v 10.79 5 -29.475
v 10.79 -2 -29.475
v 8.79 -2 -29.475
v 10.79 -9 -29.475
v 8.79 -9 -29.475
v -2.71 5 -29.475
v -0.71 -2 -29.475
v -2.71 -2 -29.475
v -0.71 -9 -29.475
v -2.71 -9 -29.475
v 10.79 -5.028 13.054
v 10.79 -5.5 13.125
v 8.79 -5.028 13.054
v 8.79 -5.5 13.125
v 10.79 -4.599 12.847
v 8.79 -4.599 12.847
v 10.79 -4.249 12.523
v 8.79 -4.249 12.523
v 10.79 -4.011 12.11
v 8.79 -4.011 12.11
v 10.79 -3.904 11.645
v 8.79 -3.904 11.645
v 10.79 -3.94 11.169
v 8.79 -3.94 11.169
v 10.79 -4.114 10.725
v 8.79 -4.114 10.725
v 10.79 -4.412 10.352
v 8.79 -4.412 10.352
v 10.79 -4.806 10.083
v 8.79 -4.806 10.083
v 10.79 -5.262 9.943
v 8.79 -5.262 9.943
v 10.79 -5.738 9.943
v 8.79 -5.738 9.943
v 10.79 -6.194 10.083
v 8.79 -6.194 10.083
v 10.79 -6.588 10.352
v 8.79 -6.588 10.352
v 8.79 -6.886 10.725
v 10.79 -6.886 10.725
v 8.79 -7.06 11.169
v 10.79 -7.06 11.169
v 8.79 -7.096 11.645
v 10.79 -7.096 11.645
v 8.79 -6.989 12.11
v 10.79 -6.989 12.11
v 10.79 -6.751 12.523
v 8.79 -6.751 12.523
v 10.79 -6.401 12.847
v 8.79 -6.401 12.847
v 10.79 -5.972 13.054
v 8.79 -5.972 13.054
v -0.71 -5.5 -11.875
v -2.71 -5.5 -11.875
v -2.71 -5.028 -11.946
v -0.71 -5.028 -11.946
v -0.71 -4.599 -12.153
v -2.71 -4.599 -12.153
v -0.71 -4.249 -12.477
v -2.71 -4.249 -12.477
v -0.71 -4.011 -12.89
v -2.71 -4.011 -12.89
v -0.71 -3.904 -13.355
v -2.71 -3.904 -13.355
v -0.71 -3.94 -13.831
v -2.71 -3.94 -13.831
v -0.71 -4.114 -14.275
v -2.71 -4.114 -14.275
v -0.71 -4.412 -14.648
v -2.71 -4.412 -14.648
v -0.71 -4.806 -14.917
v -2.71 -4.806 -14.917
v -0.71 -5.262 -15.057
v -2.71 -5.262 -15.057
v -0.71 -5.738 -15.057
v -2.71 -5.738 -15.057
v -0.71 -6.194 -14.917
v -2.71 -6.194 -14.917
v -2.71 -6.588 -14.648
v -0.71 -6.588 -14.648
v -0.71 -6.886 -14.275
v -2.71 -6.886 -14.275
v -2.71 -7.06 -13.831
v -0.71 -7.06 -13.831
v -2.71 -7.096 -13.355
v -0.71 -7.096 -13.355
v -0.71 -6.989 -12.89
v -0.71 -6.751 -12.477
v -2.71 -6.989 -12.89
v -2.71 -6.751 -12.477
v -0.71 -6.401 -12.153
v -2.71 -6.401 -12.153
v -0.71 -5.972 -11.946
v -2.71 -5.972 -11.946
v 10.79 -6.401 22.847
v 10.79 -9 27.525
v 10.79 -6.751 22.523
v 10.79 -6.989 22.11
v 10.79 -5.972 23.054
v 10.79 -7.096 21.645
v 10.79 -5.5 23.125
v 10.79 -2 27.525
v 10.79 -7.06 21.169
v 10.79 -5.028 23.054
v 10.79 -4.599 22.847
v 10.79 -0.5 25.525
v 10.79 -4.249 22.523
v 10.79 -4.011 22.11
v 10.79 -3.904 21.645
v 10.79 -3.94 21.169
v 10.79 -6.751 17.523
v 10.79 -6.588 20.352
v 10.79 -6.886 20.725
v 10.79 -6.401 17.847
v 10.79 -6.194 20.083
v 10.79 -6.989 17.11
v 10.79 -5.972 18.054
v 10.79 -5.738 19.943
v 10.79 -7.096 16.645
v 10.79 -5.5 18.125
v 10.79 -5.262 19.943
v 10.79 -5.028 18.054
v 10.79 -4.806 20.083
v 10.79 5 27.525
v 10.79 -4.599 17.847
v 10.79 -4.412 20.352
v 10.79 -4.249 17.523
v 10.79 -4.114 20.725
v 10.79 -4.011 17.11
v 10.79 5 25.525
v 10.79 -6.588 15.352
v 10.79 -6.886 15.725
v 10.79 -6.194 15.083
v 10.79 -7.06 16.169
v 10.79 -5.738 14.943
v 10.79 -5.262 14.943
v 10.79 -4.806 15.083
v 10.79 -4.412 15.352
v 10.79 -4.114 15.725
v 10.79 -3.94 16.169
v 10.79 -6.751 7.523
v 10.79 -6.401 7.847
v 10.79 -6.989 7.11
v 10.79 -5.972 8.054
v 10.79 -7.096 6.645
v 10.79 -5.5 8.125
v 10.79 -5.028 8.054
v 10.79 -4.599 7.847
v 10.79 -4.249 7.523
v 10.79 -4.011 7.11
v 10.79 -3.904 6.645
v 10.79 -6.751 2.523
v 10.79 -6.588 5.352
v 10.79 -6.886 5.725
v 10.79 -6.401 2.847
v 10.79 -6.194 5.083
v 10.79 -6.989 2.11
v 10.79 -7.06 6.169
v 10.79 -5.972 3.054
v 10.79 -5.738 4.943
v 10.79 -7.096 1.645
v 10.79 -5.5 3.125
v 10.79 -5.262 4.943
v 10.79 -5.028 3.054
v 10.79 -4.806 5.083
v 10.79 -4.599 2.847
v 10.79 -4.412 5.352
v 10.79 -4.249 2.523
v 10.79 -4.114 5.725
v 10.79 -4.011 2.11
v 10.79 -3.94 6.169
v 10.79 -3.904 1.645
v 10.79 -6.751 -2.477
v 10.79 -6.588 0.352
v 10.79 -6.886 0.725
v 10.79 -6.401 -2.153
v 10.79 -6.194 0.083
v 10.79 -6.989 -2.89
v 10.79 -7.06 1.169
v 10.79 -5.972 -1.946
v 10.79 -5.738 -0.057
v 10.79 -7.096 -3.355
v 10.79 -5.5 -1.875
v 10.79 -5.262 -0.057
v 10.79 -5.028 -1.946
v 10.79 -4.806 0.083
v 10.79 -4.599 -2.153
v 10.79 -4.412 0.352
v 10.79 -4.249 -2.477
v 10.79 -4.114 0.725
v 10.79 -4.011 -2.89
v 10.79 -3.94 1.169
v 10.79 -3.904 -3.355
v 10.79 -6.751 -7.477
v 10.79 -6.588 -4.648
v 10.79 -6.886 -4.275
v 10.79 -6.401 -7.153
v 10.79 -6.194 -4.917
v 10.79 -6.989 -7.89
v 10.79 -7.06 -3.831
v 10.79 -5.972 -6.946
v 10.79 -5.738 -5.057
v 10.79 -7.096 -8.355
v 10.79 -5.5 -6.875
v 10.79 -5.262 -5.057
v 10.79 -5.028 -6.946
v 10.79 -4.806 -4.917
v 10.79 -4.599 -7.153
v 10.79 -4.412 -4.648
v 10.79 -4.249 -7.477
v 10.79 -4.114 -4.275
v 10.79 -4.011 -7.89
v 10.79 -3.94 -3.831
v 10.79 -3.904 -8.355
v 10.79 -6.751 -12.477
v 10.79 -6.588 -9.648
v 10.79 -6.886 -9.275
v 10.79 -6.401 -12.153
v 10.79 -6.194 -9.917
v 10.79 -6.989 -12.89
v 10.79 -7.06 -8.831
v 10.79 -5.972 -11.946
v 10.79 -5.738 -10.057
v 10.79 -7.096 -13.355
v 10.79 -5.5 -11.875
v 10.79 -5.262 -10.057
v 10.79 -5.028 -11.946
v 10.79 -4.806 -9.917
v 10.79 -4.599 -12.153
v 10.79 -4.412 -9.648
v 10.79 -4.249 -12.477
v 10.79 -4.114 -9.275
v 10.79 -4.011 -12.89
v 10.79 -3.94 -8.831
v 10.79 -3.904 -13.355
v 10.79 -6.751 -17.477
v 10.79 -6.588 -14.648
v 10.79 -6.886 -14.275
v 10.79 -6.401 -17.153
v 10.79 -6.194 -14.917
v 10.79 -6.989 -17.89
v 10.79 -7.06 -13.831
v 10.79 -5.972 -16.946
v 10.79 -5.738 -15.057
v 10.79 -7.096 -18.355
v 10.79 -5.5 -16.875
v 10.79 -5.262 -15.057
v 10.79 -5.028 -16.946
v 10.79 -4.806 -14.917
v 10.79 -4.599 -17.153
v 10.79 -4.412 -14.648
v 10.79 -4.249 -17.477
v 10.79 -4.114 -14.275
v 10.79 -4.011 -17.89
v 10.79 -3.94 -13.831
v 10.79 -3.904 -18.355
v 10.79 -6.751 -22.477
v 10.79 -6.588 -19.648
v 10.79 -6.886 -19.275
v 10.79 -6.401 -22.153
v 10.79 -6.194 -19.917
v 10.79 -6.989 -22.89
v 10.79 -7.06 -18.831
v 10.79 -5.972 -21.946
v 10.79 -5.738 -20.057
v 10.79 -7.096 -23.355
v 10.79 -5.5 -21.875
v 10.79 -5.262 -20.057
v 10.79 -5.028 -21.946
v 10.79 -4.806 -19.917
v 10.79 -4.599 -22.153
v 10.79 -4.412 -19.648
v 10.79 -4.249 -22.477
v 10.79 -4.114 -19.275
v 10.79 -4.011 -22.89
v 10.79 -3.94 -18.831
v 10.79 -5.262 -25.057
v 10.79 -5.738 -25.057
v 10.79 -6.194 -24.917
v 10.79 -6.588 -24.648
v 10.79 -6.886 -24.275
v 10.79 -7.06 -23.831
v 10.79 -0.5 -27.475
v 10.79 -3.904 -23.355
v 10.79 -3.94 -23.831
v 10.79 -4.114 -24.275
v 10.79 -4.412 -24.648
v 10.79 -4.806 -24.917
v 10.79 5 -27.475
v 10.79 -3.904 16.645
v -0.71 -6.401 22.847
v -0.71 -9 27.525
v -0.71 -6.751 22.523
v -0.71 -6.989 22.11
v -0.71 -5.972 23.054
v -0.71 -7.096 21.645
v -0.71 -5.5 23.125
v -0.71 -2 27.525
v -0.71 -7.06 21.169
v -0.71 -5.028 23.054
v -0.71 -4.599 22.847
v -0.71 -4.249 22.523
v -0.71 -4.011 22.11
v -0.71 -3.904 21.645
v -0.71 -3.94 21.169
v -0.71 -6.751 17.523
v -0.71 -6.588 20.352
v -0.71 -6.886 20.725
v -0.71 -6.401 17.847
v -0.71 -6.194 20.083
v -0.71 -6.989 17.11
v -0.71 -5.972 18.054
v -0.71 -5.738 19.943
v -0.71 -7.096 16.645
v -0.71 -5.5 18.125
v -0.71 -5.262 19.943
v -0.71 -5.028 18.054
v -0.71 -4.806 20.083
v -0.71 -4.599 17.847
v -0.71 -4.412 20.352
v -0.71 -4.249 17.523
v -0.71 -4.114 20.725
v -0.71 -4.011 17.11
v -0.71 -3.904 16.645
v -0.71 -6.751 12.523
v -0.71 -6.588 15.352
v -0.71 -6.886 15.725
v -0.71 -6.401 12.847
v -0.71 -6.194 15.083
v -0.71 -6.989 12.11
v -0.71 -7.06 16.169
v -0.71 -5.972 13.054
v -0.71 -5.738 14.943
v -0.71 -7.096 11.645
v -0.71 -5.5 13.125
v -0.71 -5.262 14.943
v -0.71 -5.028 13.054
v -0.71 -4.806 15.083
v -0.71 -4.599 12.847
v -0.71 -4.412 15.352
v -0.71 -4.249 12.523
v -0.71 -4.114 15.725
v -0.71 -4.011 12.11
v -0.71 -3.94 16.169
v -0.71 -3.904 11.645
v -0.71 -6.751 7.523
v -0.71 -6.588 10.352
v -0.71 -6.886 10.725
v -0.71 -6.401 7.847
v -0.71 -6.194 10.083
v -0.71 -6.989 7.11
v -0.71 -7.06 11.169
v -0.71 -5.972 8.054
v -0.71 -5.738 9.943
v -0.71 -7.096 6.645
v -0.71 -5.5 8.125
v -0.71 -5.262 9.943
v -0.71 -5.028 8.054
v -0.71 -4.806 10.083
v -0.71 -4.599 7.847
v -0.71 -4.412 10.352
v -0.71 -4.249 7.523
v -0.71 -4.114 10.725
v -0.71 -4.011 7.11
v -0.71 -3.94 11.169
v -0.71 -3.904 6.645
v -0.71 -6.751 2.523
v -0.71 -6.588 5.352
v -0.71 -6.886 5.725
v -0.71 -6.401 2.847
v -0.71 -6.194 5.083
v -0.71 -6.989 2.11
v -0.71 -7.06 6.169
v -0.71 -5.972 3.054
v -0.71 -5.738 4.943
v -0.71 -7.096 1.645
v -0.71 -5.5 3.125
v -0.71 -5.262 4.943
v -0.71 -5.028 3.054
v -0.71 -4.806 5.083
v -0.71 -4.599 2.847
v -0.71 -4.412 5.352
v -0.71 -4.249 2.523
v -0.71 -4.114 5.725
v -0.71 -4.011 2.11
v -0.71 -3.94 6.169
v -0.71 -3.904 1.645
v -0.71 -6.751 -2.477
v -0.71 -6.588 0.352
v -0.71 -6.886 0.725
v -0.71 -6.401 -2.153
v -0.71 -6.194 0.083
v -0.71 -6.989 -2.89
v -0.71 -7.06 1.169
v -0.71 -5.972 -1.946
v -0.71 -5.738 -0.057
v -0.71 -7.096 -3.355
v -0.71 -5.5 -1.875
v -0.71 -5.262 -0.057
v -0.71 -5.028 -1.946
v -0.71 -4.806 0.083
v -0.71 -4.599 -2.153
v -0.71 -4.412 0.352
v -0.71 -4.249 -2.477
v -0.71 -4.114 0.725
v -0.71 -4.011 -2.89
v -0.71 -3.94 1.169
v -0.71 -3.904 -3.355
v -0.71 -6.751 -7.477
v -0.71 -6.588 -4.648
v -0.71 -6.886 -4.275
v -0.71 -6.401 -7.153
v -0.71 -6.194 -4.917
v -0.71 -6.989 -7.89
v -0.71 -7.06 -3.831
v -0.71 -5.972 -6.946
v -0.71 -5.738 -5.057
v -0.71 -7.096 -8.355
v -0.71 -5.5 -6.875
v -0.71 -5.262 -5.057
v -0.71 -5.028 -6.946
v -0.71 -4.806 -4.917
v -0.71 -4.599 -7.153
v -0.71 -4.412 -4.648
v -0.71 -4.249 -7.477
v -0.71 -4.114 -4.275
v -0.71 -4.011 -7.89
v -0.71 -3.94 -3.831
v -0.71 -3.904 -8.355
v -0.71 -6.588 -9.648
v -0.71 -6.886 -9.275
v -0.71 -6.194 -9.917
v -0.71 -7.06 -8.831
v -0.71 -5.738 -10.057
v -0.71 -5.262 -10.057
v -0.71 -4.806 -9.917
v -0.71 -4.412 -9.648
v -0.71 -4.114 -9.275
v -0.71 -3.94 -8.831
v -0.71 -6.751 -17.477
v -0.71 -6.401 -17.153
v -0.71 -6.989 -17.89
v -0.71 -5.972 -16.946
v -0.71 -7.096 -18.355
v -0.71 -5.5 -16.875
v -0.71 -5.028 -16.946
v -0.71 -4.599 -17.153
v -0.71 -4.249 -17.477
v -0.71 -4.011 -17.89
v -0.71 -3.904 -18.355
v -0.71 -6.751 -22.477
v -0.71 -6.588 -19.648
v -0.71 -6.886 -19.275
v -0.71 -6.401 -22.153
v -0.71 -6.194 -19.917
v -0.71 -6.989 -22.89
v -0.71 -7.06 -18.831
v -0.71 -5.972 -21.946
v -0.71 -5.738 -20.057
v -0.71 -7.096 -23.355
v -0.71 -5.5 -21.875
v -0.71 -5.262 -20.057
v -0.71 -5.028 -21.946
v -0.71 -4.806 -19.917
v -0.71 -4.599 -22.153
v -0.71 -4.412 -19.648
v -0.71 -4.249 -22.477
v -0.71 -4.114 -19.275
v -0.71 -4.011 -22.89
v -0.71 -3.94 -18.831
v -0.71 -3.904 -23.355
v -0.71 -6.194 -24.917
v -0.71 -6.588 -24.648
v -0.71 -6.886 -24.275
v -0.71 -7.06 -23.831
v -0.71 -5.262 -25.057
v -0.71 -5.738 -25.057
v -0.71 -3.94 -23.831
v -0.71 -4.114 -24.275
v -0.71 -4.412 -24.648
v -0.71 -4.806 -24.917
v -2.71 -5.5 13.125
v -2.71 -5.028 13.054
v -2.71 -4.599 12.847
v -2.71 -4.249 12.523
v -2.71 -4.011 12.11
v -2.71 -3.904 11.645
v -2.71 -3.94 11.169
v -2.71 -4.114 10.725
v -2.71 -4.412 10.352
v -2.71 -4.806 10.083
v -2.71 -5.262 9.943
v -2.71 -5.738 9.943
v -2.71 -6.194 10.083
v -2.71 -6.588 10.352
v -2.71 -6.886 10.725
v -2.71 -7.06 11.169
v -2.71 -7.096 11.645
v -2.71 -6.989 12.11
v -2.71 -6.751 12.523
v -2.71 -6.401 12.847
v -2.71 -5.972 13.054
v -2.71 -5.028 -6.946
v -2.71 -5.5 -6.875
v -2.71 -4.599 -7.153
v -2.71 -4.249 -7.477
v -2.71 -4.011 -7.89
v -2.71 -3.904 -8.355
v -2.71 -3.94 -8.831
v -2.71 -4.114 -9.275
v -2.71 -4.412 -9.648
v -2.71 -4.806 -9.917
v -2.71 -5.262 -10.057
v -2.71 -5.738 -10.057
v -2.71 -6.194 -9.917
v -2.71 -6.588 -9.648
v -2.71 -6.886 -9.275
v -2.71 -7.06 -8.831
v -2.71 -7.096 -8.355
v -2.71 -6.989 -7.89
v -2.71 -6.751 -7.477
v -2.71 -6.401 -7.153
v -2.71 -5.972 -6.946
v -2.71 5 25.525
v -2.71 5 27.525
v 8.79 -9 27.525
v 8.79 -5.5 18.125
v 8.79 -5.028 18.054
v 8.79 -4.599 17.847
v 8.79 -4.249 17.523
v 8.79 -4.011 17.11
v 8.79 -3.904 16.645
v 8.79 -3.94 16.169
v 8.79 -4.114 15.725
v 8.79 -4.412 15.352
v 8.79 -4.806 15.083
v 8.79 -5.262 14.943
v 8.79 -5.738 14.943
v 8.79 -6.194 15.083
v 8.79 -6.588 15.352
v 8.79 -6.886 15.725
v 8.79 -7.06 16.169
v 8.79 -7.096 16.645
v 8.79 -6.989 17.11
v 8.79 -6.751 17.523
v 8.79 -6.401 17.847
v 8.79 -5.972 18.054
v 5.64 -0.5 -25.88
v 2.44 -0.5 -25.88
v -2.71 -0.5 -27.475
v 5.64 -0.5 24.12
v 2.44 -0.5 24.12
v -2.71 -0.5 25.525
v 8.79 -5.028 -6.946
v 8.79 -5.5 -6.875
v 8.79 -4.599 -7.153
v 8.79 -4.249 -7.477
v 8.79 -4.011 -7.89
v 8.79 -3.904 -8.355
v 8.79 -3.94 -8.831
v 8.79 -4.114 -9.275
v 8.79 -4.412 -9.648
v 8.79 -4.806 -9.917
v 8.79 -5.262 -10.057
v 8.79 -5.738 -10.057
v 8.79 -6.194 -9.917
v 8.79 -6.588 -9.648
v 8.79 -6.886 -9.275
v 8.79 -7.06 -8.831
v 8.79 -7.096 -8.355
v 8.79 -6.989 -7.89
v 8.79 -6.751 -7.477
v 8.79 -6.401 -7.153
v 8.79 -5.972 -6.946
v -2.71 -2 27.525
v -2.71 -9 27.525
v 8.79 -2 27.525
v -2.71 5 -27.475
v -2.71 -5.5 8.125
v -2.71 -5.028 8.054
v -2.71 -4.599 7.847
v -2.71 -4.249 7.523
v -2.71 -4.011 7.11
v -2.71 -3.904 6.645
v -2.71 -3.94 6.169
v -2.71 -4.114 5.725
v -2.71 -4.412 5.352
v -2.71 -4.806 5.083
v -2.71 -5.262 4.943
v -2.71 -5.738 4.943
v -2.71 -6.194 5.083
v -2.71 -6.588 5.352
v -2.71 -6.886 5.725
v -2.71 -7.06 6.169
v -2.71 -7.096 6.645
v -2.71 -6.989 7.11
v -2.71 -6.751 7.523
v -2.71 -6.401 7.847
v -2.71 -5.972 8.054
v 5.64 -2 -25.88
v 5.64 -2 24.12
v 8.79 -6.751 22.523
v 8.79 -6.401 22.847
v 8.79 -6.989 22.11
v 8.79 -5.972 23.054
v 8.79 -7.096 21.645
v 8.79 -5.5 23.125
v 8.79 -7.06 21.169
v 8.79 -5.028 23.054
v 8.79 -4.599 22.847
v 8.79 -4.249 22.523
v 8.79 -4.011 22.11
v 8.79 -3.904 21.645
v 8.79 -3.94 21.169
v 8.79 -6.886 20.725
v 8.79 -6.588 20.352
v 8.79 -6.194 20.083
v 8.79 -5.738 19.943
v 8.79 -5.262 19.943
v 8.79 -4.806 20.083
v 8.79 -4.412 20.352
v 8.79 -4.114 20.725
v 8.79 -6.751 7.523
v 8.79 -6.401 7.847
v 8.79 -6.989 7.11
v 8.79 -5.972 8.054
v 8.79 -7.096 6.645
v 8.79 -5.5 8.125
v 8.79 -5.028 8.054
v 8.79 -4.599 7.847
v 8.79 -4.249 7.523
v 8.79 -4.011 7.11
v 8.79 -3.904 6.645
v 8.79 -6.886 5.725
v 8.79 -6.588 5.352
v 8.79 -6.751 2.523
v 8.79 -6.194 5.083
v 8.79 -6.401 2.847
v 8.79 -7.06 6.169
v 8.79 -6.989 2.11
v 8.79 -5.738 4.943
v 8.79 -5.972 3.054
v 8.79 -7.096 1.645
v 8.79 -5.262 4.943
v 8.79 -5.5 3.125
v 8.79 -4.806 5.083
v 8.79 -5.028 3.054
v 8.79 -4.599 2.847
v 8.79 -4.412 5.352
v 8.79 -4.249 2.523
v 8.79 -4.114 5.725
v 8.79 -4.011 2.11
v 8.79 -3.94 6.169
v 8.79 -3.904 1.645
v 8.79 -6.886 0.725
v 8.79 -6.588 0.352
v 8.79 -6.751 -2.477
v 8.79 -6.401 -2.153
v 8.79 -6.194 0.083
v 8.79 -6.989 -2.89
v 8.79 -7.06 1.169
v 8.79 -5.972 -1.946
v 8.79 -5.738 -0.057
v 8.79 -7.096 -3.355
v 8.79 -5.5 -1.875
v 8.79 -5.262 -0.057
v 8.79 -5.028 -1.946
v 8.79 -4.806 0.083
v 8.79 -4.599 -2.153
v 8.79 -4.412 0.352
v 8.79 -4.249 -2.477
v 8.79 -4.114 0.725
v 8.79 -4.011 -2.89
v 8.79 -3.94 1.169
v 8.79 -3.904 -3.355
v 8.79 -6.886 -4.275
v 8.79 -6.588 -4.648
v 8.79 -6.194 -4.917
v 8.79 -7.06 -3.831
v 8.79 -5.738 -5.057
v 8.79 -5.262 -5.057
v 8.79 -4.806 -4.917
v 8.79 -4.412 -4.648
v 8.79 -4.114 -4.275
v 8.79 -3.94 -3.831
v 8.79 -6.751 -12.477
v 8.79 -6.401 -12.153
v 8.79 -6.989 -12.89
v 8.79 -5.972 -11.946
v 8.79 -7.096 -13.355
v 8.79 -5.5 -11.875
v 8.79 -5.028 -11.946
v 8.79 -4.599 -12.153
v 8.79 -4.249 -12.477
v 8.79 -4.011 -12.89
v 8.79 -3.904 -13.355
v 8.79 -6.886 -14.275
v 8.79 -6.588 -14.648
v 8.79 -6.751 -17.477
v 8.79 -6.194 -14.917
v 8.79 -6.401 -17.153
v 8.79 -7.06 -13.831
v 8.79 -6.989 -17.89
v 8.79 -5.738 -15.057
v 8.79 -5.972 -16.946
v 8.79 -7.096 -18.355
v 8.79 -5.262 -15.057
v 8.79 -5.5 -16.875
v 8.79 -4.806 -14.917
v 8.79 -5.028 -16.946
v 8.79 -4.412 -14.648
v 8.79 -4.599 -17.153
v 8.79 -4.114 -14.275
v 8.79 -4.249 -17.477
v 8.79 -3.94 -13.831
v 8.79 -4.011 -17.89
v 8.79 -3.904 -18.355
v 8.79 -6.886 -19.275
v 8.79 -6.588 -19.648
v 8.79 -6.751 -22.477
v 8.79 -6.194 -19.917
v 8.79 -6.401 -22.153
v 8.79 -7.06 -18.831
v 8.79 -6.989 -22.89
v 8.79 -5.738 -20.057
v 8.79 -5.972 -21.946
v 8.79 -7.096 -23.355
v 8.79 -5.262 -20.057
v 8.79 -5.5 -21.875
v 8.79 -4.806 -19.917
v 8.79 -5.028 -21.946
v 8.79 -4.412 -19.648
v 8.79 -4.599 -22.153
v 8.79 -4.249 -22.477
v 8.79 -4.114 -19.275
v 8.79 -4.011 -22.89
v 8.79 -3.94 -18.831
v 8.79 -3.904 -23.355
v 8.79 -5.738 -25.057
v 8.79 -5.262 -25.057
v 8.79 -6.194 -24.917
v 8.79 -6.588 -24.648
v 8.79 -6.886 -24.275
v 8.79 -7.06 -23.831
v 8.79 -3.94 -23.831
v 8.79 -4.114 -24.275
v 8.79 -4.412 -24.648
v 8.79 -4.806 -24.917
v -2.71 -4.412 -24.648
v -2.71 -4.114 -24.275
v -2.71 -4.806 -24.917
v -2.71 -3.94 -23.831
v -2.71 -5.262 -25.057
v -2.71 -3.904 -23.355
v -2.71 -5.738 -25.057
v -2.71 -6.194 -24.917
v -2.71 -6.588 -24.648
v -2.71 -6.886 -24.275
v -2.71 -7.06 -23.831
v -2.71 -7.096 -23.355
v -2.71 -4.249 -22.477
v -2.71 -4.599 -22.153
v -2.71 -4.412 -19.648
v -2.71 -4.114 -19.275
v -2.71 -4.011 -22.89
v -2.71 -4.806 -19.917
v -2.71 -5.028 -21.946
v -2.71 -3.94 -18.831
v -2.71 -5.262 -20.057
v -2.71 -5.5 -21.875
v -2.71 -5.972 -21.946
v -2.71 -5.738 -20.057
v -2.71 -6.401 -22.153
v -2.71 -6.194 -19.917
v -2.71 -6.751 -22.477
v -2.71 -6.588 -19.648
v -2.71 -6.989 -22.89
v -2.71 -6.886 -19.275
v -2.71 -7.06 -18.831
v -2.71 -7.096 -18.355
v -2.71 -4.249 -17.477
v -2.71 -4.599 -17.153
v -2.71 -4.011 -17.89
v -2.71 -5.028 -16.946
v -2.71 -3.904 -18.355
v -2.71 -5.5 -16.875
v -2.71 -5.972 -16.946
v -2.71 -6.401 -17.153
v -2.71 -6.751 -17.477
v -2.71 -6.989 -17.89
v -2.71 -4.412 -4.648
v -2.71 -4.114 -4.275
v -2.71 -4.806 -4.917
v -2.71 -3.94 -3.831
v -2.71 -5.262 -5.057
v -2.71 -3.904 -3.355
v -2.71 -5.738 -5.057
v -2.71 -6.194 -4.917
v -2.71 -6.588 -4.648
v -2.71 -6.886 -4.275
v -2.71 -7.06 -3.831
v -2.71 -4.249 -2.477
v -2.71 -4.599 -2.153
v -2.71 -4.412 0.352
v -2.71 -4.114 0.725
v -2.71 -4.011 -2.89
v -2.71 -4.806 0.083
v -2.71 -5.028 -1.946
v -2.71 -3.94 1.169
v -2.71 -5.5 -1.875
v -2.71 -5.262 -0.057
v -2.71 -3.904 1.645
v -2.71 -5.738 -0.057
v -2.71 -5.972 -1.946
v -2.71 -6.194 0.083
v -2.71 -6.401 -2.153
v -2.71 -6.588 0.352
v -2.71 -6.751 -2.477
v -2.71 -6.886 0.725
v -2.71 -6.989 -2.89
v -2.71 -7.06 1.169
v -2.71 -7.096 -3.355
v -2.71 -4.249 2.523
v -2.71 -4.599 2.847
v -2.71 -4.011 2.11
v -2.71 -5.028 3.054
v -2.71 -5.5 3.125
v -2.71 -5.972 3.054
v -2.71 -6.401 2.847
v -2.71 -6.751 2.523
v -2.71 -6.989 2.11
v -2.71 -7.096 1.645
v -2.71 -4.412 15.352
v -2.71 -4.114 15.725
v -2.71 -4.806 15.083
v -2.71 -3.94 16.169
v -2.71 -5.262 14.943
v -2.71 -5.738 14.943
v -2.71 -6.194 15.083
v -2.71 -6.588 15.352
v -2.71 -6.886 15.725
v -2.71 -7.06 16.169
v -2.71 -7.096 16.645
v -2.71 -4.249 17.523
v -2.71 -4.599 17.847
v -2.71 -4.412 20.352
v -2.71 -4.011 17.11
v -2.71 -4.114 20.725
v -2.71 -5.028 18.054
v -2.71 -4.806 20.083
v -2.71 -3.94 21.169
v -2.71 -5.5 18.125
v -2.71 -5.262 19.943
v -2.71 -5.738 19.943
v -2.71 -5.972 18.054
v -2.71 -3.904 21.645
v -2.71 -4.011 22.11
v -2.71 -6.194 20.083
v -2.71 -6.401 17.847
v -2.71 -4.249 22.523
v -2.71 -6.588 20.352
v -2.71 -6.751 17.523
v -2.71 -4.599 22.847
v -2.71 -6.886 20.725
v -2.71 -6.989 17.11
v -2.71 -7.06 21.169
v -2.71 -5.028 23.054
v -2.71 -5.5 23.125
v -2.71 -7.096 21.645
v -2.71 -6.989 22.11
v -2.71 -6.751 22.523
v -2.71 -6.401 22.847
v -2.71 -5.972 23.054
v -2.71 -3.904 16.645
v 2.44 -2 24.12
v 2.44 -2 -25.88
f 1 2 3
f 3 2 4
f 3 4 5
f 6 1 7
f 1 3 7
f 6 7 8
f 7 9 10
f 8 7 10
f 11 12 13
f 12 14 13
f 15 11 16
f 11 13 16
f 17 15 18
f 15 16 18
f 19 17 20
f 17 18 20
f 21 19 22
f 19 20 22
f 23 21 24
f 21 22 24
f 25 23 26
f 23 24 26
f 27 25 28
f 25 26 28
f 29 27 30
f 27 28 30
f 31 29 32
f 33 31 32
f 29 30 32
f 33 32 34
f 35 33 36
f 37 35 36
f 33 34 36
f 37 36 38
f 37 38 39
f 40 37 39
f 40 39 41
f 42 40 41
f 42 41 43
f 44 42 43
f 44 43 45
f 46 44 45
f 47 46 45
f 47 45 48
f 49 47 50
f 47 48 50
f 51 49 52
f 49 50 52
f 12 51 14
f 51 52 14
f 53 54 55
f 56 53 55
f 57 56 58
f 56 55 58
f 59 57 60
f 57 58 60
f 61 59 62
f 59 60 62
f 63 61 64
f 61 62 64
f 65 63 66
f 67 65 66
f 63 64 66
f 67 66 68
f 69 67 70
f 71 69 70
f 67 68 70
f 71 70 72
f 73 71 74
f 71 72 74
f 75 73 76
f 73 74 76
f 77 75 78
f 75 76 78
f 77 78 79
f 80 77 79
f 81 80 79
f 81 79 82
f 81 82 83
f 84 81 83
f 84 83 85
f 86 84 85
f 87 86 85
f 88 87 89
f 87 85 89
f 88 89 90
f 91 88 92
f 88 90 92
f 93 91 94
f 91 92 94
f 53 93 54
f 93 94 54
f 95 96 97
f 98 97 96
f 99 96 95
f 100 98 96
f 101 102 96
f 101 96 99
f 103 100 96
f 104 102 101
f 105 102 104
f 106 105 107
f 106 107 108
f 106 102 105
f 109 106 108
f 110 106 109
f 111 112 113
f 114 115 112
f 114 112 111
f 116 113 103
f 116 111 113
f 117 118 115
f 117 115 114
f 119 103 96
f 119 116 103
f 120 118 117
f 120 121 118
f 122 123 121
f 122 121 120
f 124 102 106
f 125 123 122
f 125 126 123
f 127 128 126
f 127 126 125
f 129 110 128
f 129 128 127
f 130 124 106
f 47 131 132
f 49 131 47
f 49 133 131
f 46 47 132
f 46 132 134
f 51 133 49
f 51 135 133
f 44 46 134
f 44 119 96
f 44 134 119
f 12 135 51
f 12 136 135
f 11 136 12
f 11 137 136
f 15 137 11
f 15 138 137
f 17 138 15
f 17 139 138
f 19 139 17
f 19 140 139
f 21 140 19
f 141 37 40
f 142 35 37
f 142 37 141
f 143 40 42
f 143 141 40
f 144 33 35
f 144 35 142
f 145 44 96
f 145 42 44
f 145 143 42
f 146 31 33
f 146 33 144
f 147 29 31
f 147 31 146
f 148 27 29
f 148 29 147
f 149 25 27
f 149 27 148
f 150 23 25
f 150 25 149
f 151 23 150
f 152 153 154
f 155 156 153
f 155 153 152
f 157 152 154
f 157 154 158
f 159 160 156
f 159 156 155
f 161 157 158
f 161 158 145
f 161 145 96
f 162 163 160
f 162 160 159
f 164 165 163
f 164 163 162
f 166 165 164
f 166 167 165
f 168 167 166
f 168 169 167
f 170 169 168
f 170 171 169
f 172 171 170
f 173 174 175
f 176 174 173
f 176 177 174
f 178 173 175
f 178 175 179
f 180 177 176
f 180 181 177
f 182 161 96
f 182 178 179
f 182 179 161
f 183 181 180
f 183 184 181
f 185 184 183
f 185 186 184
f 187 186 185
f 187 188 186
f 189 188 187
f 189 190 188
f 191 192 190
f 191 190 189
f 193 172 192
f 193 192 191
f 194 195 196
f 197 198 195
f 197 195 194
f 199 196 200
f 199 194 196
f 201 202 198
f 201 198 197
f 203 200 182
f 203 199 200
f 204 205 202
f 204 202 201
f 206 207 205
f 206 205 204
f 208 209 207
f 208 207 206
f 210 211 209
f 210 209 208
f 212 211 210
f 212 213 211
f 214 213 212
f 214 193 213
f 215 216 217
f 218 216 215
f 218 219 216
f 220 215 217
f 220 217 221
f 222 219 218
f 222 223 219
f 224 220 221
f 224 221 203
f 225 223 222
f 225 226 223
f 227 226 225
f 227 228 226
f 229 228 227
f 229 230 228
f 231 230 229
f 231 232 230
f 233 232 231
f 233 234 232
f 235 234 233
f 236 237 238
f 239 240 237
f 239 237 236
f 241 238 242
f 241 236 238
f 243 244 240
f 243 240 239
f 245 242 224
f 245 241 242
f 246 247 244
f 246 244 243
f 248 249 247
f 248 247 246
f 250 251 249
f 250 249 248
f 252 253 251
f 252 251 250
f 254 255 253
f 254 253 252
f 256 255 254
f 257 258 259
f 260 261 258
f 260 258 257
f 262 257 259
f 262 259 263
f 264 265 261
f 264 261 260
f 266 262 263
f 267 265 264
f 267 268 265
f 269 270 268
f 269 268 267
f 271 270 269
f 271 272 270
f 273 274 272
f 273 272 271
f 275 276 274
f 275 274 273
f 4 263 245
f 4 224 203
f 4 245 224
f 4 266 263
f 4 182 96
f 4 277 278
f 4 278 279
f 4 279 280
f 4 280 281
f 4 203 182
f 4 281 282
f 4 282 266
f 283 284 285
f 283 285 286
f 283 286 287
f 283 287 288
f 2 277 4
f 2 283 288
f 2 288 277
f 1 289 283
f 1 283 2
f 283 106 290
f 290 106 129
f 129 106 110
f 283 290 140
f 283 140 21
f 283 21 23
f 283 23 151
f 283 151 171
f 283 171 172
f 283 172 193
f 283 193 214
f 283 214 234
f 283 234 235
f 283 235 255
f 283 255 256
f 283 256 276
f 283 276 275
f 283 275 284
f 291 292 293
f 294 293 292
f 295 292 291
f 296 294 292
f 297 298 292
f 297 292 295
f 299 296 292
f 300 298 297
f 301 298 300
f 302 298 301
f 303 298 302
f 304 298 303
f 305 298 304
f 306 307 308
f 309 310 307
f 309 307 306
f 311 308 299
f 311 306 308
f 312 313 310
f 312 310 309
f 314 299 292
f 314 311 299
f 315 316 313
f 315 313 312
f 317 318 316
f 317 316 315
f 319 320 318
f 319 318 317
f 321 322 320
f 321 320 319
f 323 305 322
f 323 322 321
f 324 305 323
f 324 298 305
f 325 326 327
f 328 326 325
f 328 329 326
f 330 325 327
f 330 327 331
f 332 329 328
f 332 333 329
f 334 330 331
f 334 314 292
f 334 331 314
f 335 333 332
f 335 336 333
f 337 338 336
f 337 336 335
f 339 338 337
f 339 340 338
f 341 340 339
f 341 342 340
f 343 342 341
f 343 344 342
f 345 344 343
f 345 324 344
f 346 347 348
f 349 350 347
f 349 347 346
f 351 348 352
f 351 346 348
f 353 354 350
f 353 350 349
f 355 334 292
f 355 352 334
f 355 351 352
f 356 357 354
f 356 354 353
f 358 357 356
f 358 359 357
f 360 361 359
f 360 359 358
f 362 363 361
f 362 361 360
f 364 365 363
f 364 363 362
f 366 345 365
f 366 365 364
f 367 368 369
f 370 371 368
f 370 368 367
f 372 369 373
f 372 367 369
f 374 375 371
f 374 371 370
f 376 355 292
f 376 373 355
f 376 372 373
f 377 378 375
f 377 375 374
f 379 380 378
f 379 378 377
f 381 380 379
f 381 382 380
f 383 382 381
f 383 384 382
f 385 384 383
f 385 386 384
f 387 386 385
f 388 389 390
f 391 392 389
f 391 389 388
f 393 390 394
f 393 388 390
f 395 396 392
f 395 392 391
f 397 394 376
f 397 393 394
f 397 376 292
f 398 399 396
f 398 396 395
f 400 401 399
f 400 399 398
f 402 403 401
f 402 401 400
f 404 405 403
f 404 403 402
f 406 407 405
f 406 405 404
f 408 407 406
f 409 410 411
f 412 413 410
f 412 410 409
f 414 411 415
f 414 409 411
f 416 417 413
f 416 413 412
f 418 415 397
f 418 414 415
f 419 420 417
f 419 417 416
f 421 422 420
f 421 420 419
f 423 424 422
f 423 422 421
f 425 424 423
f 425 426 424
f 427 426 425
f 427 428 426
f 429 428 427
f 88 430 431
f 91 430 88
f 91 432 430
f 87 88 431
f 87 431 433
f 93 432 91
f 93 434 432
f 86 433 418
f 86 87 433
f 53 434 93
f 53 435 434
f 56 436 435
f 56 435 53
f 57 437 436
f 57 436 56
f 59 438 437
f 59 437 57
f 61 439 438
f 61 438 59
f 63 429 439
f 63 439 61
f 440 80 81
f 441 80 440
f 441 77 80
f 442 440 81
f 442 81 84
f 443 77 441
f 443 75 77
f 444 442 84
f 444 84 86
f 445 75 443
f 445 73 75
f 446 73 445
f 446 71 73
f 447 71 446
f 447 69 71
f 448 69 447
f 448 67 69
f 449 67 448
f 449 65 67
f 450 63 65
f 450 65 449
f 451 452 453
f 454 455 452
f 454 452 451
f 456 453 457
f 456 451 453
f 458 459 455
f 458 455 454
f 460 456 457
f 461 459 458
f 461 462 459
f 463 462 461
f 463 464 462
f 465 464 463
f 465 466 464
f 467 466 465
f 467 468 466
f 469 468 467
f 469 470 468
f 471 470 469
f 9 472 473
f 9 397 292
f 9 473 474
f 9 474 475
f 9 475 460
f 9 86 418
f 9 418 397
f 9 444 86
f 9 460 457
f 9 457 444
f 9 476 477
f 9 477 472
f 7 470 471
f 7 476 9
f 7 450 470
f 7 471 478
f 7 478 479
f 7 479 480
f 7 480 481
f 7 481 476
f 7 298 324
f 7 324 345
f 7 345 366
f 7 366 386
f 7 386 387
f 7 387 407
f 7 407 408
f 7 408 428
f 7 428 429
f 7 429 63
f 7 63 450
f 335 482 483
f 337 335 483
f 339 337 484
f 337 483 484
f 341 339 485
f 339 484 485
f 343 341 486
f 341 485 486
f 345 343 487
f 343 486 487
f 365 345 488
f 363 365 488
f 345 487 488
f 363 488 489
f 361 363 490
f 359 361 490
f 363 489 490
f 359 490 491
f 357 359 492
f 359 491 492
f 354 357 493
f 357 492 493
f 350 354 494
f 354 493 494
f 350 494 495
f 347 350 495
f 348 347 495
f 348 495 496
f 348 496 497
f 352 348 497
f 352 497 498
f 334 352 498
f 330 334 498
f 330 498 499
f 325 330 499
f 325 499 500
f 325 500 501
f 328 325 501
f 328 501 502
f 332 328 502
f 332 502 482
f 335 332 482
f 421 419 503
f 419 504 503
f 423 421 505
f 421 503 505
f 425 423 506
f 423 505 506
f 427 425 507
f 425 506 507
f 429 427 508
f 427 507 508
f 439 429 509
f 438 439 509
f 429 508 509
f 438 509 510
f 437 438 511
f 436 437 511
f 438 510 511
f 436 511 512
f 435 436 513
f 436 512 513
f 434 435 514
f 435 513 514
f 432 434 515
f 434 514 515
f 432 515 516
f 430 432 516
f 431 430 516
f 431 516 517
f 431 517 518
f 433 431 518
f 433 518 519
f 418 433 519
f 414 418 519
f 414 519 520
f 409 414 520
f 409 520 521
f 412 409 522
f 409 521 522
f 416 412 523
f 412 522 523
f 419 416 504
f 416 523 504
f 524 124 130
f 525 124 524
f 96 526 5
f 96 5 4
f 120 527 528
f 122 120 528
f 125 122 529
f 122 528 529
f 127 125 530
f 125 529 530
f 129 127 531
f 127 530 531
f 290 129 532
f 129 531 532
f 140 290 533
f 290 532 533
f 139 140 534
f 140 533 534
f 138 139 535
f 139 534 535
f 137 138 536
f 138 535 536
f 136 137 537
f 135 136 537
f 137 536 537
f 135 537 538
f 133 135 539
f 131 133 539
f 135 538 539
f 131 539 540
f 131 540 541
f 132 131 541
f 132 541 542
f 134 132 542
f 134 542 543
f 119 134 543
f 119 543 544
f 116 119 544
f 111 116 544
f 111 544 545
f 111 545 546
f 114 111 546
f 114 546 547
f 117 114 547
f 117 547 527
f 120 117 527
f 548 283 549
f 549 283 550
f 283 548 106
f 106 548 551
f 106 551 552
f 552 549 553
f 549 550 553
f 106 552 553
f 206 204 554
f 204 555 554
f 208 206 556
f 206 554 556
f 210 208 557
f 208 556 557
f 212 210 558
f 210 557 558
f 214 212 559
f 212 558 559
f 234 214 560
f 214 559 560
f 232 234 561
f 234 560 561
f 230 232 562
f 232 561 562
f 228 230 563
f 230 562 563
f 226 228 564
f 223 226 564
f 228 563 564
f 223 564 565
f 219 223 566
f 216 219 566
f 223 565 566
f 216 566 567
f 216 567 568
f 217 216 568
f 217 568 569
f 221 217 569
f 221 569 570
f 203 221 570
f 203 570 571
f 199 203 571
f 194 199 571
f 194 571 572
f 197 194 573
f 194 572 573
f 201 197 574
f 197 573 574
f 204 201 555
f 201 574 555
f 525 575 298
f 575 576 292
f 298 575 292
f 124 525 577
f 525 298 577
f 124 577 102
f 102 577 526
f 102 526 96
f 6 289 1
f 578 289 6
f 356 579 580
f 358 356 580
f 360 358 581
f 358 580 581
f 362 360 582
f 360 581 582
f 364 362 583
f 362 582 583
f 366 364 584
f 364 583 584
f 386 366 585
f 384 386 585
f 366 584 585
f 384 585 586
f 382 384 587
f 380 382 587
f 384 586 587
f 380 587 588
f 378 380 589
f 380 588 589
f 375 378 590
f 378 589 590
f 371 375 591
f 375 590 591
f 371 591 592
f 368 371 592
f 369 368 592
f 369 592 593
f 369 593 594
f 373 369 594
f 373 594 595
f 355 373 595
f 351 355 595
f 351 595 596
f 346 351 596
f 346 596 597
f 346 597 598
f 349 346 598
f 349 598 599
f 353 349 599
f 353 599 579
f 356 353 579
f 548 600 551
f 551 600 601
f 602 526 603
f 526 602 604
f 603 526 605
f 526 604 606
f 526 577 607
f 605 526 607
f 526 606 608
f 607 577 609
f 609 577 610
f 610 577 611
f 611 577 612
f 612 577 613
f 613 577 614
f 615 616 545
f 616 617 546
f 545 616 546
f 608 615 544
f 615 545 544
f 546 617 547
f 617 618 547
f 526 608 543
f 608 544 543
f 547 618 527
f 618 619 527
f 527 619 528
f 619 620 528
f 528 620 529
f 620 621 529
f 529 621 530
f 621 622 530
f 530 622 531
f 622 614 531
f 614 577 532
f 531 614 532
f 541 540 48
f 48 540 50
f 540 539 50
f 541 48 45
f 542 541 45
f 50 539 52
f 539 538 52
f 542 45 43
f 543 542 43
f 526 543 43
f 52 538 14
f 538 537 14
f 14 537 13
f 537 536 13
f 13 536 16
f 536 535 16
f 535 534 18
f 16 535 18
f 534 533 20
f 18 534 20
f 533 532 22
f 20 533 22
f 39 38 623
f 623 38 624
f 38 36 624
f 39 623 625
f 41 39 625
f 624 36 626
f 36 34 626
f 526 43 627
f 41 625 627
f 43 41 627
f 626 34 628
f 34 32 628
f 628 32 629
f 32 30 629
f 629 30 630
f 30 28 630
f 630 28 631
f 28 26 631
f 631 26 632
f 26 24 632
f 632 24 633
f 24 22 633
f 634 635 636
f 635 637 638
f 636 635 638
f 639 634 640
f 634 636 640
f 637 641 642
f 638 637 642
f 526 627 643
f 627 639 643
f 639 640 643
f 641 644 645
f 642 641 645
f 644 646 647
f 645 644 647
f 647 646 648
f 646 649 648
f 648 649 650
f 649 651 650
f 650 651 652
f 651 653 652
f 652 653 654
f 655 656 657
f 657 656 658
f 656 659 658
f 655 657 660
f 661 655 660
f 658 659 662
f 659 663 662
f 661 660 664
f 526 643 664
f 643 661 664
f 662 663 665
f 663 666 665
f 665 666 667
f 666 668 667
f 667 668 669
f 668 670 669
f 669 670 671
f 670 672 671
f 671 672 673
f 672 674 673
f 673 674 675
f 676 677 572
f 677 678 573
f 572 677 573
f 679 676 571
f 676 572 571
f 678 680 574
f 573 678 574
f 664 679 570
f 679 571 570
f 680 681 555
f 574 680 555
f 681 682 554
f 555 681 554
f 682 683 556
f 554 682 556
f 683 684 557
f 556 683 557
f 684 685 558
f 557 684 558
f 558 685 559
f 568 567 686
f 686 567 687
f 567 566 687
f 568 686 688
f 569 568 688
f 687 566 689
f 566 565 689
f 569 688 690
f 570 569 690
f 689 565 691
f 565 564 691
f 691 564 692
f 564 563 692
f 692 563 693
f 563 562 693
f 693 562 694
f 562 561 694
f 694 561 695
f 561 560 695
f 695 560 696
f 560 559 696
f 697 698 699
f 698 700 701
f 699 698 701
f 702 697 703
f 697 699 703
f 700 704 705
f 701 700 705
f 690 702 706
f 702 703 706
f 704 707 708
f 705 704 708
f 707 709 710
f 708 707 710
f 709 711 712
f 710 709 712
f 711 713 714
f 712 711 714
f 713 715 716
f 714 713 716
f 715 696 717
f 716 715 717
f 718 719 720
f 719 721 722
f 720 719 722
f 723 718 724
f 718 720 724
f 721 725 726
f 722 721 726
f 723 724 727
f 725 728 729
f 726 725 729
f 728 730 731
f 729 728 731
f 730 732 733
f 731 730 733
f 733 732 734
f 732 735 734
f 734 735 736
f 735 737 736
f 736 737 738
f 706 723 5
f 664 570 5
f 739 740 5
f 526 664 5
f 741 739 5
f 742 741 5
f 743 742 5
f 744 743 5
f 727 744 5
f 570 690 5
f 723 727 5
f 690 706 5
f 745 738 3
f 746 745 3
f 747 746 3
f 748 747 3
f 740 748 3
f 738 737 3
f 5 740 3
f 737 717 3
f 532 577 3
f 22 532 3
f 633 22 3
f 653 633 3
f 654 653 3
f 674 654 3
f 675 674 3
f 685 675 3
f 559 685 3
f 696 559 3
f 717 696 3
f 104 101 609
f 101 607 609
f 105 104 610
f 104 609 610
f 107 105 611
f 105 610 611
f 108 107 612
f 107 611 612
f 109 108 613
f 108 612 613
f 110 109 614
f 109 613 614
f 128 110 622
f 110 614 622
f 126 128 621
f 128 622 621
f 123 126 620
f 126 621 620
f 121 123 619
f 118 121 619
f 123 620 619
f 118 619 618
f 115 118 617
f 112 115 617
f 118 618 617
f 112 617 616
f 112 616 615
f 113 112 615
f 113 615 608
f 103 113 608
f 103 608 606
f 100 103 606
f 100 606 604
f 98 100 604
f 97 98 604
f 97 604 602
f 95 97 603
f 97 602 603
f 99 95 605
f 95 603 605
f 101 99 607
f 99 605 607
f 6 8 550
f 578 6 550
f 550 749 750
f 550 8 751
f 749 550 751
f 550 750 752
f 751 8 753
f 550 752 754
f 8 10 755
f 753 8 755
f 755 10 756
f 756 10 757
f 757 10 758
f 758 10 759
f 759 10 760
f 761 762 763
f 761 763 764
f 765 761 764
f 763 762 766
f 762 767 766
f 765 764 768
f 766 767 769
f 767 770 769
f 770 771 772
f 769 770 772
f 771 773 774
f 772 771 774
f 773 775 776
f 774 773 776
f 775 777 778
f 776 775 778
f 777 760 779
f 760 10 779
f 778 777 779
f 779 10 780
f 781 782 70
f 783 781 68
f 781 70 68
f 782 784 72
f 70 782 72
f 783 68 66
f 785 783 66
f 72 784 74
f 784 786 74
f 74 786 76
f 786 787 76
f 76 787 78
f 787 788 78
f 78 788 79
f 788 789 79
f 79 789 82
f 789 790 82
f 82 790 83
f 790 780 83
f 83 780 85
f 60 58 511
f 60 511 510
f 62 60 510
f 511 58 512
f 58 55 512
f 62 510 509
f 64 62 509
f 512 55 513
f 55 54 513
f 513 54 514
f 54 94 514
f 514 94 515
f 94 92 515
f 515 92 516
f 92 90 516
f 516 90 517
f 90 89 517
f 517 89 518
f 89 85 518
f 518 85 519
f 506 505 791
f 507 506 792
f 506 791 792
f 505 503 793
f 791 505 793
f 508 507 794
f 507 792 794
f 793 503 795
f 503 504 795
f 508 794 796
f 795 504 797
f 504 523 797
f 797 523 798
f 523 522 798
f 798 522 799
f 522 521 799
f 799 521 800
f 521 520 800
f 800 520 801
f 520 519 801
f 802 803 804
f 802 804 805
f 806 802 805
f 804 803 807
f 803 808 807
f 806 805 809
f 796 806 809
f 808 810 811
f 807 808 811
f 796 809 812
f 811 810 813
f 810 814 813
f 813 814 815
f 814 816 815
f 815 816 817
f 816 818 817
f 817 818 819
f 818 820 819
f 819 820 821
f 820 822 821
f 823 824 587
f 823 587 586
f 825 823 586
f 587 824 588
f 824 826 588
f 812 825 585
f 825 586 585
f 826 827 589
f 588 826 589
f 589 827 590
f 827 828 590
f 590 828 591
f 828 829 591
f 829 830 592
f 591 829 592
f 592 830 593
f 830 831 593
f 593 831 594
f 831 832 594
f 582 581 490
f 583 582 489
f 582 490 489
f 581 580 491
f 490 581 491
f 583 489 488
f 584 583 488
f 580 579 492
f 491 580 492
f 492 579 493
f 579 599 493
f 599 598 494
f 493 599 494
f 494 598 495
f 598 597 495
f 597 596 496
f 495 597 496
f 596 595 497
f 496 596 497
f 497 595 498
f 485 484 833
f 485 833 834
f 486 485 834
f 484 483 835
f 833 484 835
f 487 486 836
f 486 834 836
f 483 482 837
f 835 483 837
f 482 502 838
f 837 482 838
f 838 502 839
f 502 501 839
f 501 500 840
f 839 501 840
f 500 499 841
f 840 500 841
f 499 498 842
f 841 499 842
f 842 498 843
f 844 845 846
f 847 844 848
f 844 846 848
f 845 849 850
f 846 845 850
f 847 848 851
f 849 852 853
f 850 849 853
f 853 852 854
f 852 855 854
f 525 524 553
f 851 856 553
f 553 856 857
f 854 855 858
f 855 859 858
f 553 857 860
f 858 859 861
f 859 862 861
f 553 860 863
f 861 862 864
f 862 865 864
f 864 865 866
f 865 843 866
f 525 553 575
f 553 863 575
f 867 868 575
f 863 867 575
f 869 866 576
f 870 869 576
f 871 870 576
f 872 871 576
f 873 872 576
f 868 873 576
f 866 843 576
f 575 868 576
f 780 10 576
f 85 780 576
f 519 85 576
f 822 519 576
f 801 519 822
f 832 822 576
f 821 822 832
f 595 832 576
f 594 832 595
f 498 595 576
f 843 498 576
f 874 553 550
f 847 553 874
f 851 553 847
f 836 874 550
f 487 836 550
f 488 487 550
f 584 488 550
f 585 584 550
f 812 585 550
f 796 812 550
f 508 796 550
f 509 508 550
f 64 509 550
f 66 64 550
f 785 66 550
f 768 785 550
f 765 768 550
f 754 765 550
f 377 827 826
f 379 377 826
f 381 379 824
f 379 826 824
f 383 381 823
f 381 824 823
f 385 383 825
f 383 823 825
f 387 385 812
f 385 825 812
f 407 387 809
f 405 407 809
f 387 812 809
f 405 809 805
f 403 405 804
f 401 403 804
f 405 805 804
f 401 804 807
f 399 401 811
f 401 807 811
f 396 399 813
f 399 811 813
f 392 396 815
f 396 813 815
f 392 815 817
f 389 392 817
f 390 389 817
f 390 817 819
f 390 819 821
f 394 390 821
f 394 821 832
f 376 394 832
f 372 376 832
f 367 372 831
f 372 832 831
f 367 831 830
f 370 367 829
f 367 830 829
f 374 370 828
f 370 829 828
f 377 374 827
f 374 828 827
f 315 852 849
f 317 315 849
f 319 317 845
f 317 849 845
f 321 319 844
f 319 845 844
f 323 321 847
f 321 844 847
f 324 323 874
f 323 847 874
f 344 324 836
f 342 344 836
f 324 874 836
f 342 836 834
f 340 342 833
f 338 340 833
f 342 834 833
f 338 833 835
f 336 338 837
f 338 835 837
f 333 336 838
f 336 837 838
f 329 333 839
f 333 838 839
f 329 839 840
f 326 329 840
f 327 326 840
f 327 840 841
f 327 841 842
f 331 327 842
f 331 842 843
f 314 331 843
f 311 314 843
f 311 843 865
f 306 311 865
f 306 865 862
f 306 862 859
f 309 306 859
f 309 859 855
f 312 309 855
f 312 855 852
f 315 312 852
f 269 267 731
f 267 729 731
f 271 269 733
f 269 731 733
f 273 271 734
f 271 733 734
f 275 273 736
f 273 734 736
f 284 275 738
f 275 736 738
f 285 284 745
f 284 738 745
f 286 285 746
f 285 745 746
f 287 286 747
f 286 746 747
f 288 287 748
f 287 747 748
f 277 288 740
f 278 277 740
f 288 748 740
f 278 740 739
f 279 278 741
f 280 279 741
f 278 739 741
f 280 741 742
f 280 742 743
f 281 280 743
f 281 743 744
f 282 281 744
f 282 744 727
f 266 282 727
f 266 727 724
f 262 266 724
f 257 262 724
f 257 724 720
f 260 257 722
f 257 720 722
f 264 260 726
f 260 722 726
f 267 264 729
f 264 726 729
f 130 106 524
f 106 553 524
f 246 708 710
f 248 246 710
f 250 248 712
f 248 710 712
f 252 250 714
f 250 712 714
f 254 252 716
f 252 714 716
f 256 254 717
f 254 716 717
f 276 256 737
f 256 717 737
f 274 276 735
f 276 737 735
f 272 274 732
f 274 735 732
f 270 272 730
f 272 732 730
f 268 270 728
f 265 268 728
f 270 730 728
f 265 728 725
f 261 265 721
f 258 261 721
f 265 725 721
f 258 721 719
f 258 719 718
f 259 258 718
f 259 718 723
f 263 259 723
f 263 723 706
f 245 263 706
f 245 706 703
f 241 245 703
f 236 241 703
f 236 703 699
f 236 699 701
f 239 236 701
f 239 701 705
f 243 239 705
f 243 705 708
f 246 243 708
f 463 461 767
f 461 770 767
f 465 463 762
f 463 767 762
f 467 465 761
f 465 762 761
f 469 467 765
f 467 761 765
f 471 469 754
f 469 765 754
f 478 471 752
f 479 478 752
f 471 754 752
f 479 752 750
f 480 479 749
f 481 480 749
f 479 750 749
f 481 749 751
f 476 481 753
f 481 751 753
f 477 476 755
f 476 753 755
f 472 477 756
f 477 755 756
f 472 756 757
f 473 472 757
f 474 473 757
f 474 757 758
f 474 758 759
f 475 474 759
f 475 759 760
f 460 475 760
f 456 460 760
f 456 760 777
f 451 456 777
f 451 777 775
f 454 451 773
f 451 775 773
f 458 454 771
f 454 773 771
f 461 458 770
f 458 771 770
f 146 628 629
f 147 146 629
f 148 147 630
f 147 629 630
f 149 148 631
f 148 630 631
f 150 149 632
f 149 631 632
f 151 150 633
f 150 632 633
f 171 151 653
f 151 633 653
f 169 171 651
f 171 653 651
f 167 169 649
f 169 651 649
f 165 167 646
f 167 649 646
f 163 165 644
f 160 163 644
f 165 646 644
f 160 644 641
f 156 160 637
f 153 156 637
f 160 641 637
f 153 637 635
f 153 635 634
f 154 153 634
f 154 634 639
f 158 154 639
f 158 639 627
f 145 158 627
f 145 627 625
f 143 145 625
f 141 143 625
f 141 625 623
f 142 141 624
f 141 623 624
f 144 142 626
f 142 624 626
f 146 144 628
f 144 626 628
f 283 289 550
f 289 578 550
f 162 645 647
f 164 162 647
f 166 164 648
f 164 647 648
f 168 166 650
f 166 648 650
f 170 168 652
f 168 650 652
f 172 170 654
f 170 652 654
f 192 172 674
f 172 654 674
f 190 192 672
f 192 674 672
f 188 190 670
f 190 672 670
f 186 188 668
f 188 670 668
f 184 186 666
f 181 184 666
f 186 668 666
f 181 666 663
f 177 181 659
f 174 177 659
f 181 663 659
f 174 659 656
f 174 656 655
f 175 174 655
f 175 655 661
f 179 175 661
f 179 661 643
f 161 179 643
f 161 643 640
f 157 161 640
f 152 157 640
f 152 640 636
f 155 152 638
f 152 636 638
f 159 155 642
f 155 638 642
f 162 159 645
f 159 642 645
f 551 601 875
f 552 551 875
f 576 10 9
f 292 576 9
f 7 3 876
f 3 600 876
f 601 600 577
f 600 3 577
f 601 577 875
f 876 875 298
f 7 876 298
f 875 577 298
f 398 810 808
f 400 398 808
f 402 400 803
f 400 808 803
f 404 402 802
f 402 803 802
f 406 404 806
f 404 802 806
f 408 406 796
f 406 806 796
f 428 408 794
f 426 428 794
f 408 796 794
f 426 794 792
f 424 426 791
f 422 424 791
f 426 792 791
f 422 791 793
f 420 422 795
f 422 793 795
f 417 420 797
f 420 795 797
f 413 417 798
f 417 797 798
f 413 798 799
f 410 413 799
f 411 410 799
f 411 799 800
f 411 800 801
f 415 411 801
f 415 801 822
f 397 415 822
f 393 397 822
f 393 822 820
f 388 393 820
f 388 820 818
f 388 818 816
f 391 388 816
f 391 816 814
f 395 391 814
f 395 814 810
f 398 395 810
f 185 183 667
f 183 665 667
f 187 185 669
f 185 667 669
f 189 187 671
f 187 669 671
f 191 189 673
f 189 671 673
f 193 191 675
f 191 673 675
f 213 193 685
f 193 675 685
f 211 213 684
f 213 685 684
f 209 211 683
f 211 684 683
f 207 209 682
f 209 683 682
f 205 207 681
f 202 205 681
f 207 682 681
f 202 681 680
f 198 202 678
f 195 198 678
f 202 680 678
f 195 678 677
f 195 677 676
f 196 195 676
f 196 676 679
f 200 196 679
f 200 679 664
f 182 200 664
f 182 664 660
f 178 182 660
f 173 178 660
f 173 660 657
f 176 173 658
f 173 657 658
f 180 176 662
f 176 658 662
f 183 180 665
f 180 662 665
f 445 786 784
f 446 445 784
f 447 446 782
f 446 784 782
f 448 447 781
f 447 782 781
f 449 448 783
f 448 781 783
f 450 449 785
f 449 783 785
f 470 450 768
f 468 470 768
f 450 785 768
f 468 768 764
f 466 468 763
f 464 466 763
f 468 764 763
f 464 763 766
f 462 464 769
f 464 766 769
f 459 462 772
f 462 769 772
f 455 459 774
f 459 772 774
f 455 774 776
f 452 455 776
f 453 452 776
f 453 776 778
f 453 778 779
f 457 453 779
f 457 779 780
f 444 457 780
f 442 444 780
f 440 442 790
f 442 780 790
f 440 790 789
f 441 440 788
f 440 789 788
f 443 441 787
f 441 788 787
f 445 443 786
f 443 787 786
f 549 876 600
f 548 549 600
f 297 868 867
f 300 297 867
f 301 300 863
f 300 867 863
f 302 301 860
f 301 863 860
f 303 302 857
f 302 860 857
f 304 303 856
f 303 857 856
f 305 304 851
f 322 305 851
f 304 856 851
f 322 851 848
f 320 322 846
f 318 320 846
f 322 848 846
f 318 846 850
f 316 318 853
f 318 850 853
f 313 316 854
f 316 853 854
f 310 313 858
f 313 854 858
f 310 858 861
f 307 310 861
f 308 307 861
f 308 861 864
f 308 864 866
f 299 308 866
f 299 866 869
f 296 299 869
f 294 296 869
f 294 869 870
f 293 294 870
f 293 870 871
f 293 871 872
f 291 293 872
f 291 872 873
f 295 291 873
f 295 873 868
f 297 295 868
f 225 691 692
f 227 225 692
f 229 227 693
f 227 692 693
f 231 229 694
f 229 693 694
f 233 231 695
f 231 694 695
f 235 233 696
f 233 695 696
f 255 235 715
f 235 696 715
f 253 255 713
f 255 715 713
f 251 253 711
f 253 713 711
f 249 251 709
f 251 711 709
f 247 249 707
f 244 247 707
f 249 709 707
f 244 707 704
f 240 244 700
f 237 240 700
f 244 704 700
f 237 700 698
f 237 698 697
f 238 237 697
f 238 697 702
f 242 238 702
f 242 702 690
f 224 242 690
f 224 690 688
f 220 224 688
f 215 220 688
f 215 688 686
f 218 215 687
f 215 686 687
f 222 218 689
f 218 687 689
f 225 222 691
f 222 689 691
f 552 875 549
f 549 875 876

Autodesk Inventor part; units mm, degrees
ref_plane "YZ Plane" through (0, 0, 0) normal (1, 0, 0) x (0, 1, 0)
ref_plane "XZ Plane" through (0, 0, 0) normal (0, 1, 0) x (-1, 0, 0)
ref_plane "XY Plane" through (0, 0, 0) normal (0, 0, 1) x (1, 0, 0)
sketch "Sketch1" plane through (0, 0, 0) normal (0, 1, 0) x (-1, 0, 0)
  line L0 (2.7098, 27.525) -> (-10.7902, 27.525)
  line L1 (-10.7902, 27.525) -> (-10.7902, -29.475)
  line L2 (-10.7902, -29.475) -> (2.7098, -29.475)
  line L3 (2.7098, -29.475) -> (2.7098, 27.525)
  line L4 (-4.0402, 27.525) -> (-4.0402, -29.475)
  line L5 (0.7098, 27.525) -> (0.7098, -29.475)
  line L6 (-8.7902, 27.525) -> (-8.7902, -29.475)
  line L7 (-8.7902, 27.525) -> (-10.7902, 27.525)
  line L8 (-10.7902, 27.525) -> (-10.7902, -29.475)
  line L9 (-10.7902, -29.475) -> (-8.7902, -29.475)
  line L10 (-8.7902, -29.475) -> (-8.7902, 27.525)
  line L11 (2.7098, -29.475) -> (0.7098, -29.475)
  line L12 (0.7098, -29.475) -> (0.7098, 27.525)
  line L13 (0.7098, 27.525) -> (2.7098, 27.525)
  line L14 (2.7098, 27.525) -> (2.7098, -29.475)
  dimension "d31" = 57
  dimension "d33" = 2
  dimension "d34" = 9.5
extrude "Extrusion6" add sketch "Sketch1" along normal blind 5 contours L3 L2 L5 L0 | L6 L2 L1 L0
extrude "Extrusion7" add sketch "Sketch1" against normal blind 2
sketch "Sketch4" plane through (-2.7098, 5, -29.475) normal (-1, 0, 0) x (0, 0, 1)
  line L0 (57, -7) -> (57, 0) construction
  line L1 (0, 0) -> (57, 0) construction
  line L2 (0, -7) -> (0, 0) construction
  line L3 (57, -7) -> (0, -7) construction
  line L4 (55, 0) -> (2, 0)
  line L5 (2, 0) -> (2, -5.5)
  line L6 (2, -5.5) -> (55, -5.5)
  line L7 (55, -5.5) -> (55, 0)
  point P0 (29.475, -5)
  dimension "d39" = 2
  dimension "d40" = 2
  dimension "d41" = 1.5
extrude "Extrusion8" cut sketch "Sketch4" against normal up to surface (13.5 mm away)
sketch "Sketch5" plane through (8.7902, 0, 27.525) normal (-1, 0, 0) x (0, 0, 1)
  line L0 (-2, 5) -> (-2, 0) projected
  line L1 (-2, 0) -> (0, 0) projected
  line L2 (0, 0) -> (0, 5) projected
  line L3 (-2, 5) -> (0, 5) projected
  line L4 (-55, 0) -> (-55, 5) projected
  line L5 (-57, 5) -> (-55, 5) projected
  line L6 (-57, 0) -> (-57, 5) projected
  line L7 (-57, 0) -> (-55, 0) projected
  point P0 (-27.525, 0)
extrude "Extrusion9" add sketch "Sketch5" along normal through all both and the other way through all
sketch "Sketch6" plane through (0, -2, 0) normal (0, -1, 0) x (1, 0, 0)
  line L0 (10.7902, 27.525) -> (-2.7098, 27.525) construction
  line L1 (-2.7098, 27.525) -> (-2.7098, -29.475) construction
  line L2 (-2.7098, -29.475) -> (10.7902, -29.475) construction
  line L3 (10.7902, -29.475) -> (10.7902, 27.525) construction
  line L4 (4.0402, 32.9205) -> (4.0402, -29.475)
  line L5 (5.6402, 24.1195) -> (2.4402, 24.1195)
  line L6 (2.4402, 24.1195) -> (2.4402, -25.8805)
  line L7 (2.4402, -25.8805) -> (5.6402, -25.8805)
  line L8 (5.6402, -25.8805) -> (5.6402, 24.1195)
  point P0 (0, 0)
  dimension "d46" = 50
  dimension "d47" = 3.2
extrude "Extrusion10" cut sketch "Sketch6" against normal through all
sketch "Sketch7" plane through (0, -2, 0) normal (0, -1, 0) x (1, 0, 0)
  line L0 (2.4402, -25.8805) -> (2.4402, 24.1195) construction
  line L1 (2.4402, 24.1195) -> (5.6402, 24.1195) construction
  line L2 (5.6402, 24.1195) -> (5.6402, -25.8805) construction
  line L3 (5.6402, -25.8805) -> (2.4402, -25.8805) construction
  line L4 (10.7902, 27.525) -> (-2.7098, 27.525) construction
  line L5 (-2.7098, 27.525) -> (-2.7098, -29.475) construction
  line L6 (-2.7098, -29.475) -> (10.7902, -29.475) construction
  line L7 (10.7902, -29.475) -> (10.7902, 27.525) construction
  line L8 (-2.7098, 27.525) -> (-0.7098, 27.525)
  line L9 (-0.7098, 27.525) -> (-0.7098, -29.475)
  line L10 (-0.7098, -29.475) -> (-2.7098, -29.475)
  line L11 (-2.7098, -29.475) -> (-2.7098, 27.525)
  line L12 (10.7902, 27.525) -> (8.7902, 27.525)
  line L13 (8.7902, 27.525) -> (8.7902, -29.475)
  line L14 (8.7902, -29.475) -> (10.7902, -29.475)
  line L15 (10.7902, -29.475) -> (10.7902, 27.525)
  line L16 (-2.7098, -29.475) -> (10.7902, -29.475) projected
  point P0 (0, 0)
  dimension "d50" = 2
  dimension "d51" = 2
extrude "Extrusion11" add sketch "Sketch7" along normal blind 7
sketch "Sketch8" plane through (-2.7098, -0.5, 25.525) normal (-1, 0, 0) x (0, 0, 1)
  line L0 (2, -8.5) -> (2, 5.5) construction
  line L1 (0, 5.5) -> (2, 5.5) construction
  line L2 (0, 5.5) -> (0, 0) construction
  line L3 (0, 0) -> (-53, 0) construction
  line L4 (-53, 0) -> (-53, 5.5) construction
  line L5 (-55, 5.5) -> (-53, 5.5) construction
  line L6 (-55, -8.5) -> (-55, 5.5) construction
  line L7 (2, -8.5) -> (-55, -8.5) construction
  line L8 (-55, -8.5) -> (-55, 5.5) construction
  line L9 (2, -8.5) -> (-55, -8.5) construction
  line L10 (-55, -8.5) -> (-55, 0) construction
  line L11 (-55, 0) -> (2, 0) construction
  line L12 (2, 0) -> (2, -8.5) construction
  circle A0 centre (-4, -5) radius 1.6
  point P0 (-25.525, 0.5)
  dimension "d54" = 3.2
  dimension "d55" = 5
  dimension "d56" = 6
extrude "Extrusion12" cut sketch "Sketch8" against normal through all
pattern_linear "Rectangular Pattern3" count 10 spacing 5 along (0, 0, -1) of "Extrusion12"
properties part number "slider-rail-adapter"
